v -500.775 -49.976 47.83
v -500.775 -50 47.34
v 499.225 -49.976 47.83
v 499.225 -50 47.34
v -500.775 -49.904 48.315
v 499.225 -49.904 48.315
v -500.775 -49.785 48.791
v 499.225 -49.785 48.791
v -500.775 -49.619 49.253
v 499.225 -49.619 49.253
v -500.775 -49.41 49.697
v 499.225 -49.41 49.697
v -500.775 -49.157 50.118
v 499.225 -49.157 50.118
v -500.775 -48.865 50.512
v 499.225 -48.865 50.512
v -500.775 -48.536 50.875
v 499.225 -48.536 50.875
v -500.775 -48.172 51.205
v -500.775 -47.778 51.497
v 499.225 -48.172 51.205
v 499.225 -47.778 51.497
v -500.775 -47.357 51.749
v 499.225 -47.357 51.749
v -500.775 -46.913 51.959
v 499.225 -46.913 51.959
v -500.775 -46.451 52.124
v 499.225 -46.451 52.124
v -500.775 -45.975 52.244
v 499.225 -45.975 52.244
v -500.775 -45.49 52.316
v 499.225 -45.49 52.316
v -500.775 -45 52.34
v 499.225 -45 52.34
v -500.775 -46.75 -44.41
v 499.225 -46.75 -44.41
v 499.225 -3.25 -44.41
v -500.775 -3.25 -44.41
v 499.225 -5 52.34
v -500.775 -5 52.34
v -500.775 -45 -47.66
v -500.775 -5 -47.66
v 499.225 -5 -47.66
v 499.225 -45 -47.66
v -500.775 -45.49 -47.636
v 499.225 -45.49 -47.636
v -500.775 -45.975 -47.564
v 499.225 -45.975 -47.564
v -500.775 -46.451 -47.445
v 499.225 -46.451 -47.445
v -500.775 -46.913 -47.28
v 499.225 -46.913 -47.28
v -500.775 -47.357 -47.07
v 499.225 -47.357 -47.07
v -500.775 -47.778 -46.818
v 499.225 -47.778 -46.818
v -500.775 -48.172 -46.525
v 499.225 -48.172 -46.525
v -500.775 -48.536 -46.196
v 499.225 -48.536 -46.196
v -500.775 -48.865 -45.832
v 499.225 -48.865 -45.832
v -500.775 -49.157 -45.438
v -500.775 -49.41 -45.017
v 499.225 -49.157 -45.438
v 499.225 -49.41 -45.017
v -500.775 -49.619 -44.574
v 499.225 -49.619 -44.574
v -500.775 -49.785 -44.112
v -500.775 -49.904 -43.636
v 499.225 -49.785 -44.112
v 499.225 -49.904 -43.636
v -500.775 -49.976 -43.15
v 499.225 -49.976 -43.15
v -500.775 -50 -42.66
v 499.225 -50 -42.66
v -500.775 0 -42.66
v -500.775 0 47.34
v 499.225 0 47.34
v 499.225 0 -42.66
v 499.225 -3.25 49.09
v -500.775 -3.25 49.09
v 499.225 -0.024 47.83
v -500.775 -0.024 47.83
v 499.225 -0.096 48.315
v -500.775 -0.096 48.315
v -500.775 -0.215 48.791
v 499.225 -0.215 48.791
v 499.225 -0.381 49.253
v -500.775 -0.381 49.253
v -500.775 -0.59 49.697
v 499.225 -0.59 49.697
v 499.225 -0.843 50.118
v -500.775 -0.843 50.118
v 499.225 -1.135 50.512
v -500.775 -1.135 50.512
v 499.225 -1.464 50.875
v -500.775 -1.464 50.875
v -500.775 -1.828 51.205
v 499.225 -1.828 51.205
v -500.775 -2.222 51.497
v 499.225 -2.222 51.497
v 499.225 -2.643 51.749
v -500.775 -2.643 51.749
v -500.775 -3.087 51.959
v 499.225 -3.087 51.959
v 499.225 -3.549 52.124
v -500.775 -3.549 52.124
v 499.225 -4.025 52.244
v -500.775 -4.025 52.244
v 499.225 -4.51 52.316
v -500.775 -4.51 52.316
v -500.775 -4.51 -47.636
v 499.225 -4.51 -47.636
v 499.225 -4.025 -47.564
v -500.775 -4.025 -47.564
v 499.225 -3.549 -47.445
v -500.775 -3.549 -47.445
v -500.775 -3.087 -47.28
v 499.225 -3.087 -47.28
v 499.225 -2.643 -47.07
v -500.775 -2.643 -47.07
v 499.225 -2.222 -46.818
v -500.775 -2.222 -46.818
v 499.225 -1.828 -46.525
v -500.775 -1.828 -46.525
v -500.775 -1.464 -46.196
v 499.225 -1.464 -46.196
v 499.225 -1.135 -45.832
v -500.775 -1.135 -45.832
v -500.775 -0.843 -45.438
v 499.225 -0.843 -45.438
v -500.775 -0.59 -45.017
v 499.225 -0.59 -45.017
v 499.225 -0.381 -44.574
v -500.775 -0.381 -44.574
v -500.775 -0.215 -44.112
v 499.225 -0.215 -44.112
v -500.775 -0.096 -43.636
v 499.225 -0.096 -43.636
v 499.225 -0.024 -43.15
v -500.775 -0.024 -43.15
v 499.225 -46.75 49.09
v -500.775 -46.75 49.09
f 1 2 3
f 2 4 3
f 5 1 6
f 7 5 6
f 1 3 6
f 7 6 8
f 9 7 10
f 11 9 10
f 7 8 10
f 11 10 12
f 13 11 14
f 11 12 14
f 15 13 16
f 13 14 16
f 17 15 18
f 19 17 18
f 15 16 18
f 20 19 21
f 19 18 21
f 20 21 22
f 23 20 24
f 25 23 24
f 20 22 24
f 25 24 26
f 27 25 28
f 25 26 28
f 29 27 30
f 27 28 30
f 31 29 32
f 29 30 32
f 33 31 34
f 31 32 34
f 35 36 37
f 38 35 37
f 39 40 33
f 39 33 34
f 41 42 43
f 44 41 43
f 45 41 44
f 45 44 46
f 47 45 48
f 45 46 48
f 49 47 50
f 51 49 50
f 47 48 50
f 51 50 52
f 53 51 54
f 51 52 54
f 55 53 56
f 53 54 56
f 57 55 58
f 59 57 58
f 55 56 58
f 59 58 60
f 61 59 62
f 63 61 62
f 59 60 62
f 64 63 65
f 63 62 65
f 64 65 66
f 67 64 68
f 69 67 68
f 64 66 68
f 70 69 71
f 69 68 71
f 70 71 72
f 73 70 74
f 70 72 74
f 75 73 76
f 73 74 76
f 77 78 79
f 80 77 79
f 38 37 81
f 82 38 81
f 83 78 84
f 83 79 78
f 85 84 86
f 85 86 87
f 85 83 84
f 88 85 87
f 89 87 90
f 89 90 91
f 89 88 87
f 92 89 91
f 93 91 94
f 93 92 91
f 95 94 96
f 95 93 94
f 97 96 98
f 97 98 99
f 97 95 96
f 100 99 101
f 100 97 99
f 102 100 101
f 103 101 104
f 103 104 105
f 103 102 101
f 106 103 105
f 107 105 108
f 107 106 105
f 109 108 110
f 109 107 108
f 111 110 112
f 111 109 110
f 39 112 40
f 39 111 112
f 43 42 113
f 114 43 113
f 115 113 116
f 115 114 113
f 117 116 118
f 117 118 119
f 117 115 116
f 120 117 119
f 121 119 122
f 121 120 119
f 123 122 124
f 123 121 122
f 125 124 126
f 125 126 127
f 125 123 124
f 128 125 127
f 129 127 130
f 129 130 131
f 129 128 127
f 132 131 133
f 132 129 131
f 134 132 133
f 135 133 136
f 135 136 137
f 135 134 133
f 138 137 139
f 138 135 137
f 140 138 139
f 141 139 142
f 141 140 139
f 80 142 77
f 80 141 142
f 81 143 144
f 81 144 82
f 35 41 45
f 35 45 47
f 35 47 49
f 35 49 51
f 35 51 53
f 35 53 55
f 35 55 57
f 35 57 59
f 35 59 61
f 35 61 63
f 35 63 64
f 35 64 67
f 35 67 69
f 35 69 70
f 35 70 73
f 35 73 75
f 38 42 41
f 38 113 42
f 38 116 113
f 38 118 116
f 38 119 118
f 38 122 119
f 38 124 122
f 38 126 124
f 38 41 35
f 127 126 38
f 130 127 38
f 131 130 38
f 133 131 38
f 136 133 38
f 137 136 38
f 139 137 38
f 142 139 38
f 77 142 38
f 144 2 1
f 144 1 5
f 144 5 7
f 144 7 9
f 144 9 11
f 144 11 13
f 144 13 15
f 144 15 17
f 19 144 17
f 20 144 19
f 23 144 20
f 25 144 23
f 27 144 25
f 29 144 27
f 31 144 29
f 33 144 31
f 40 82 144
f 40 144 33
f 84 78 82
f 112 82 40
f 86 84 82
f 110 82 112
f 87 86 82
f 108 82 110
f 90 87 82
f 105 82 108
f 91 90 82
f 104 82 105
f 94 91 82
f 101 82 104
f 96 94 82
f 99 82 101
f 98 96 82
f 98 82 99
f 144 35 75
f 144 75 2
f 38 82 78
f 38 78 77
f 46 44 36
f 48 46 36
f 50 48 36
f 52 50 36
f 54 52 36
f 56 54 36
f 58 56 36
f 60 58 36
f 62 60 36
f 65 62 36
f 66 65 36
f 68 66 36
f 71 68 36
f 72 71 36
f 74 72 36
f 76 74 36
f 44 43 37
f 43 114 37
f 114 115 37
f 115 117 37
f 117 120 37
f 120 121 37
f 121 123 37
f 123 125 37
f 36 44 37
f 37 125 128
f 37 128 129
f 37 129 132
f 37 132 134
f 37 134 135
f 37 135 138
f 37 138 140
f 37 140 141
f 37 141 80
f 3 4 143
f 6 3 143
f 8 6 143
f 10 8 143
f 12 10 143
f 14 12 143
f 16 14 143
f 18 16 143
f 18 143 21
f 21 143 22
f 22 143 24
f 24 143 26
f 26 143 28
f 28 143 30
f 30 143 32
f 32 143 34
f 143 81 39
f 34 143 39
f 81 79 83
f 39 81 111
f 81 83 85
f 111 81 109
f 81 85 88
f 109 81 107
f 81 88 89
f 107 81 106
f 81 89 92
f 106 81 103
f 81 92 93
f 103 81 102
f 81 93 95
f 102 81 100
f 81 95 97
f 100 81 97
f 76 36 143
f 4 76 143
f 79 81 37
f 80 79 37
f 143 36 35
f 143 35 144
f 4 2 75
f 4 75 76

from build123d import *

# Parameters (mm, degrees)
F0_W     = 1000
F0_H     = 100
F1_DEPTH = 50
F2_W     = 43.5
F2_H     = 93.5
F3_DEPTH = 1000
F4_R     = 5


with BuildPart() as f1:
    # F0 (on Front) → F1 (new body)
    with BuildSketch(Plane.XZ):
        with Locations((-0.774916, 2.339742)):
            Rectangle(F0_W, F0_H)
    extrude(amount=F1_DEPTH)

    # F2 (on face) → F3 (cut, through all)
    with BuildSketch(Plane.YZ.offset(499.225084)):
        with Locations((-25, 2.339742)):
            Rectangle(F2_W, F2_H)
    extrude(amount=-F3_DEPTH, mode=Mode.SUBTRACT)

    # F4
    f4_edges = [f1.edges().sort_by_distance(p)[0] for p in [
        (-0.774916, -50, 52.339742),
        (-0.774916, 0, 52.339742),
        (-0.774916, -50, -47.660258),
        (-0.774916, 0, -47.660258),
    ]]
    fillet(f4_edges, radius=F4_R)


solid = f1.part
